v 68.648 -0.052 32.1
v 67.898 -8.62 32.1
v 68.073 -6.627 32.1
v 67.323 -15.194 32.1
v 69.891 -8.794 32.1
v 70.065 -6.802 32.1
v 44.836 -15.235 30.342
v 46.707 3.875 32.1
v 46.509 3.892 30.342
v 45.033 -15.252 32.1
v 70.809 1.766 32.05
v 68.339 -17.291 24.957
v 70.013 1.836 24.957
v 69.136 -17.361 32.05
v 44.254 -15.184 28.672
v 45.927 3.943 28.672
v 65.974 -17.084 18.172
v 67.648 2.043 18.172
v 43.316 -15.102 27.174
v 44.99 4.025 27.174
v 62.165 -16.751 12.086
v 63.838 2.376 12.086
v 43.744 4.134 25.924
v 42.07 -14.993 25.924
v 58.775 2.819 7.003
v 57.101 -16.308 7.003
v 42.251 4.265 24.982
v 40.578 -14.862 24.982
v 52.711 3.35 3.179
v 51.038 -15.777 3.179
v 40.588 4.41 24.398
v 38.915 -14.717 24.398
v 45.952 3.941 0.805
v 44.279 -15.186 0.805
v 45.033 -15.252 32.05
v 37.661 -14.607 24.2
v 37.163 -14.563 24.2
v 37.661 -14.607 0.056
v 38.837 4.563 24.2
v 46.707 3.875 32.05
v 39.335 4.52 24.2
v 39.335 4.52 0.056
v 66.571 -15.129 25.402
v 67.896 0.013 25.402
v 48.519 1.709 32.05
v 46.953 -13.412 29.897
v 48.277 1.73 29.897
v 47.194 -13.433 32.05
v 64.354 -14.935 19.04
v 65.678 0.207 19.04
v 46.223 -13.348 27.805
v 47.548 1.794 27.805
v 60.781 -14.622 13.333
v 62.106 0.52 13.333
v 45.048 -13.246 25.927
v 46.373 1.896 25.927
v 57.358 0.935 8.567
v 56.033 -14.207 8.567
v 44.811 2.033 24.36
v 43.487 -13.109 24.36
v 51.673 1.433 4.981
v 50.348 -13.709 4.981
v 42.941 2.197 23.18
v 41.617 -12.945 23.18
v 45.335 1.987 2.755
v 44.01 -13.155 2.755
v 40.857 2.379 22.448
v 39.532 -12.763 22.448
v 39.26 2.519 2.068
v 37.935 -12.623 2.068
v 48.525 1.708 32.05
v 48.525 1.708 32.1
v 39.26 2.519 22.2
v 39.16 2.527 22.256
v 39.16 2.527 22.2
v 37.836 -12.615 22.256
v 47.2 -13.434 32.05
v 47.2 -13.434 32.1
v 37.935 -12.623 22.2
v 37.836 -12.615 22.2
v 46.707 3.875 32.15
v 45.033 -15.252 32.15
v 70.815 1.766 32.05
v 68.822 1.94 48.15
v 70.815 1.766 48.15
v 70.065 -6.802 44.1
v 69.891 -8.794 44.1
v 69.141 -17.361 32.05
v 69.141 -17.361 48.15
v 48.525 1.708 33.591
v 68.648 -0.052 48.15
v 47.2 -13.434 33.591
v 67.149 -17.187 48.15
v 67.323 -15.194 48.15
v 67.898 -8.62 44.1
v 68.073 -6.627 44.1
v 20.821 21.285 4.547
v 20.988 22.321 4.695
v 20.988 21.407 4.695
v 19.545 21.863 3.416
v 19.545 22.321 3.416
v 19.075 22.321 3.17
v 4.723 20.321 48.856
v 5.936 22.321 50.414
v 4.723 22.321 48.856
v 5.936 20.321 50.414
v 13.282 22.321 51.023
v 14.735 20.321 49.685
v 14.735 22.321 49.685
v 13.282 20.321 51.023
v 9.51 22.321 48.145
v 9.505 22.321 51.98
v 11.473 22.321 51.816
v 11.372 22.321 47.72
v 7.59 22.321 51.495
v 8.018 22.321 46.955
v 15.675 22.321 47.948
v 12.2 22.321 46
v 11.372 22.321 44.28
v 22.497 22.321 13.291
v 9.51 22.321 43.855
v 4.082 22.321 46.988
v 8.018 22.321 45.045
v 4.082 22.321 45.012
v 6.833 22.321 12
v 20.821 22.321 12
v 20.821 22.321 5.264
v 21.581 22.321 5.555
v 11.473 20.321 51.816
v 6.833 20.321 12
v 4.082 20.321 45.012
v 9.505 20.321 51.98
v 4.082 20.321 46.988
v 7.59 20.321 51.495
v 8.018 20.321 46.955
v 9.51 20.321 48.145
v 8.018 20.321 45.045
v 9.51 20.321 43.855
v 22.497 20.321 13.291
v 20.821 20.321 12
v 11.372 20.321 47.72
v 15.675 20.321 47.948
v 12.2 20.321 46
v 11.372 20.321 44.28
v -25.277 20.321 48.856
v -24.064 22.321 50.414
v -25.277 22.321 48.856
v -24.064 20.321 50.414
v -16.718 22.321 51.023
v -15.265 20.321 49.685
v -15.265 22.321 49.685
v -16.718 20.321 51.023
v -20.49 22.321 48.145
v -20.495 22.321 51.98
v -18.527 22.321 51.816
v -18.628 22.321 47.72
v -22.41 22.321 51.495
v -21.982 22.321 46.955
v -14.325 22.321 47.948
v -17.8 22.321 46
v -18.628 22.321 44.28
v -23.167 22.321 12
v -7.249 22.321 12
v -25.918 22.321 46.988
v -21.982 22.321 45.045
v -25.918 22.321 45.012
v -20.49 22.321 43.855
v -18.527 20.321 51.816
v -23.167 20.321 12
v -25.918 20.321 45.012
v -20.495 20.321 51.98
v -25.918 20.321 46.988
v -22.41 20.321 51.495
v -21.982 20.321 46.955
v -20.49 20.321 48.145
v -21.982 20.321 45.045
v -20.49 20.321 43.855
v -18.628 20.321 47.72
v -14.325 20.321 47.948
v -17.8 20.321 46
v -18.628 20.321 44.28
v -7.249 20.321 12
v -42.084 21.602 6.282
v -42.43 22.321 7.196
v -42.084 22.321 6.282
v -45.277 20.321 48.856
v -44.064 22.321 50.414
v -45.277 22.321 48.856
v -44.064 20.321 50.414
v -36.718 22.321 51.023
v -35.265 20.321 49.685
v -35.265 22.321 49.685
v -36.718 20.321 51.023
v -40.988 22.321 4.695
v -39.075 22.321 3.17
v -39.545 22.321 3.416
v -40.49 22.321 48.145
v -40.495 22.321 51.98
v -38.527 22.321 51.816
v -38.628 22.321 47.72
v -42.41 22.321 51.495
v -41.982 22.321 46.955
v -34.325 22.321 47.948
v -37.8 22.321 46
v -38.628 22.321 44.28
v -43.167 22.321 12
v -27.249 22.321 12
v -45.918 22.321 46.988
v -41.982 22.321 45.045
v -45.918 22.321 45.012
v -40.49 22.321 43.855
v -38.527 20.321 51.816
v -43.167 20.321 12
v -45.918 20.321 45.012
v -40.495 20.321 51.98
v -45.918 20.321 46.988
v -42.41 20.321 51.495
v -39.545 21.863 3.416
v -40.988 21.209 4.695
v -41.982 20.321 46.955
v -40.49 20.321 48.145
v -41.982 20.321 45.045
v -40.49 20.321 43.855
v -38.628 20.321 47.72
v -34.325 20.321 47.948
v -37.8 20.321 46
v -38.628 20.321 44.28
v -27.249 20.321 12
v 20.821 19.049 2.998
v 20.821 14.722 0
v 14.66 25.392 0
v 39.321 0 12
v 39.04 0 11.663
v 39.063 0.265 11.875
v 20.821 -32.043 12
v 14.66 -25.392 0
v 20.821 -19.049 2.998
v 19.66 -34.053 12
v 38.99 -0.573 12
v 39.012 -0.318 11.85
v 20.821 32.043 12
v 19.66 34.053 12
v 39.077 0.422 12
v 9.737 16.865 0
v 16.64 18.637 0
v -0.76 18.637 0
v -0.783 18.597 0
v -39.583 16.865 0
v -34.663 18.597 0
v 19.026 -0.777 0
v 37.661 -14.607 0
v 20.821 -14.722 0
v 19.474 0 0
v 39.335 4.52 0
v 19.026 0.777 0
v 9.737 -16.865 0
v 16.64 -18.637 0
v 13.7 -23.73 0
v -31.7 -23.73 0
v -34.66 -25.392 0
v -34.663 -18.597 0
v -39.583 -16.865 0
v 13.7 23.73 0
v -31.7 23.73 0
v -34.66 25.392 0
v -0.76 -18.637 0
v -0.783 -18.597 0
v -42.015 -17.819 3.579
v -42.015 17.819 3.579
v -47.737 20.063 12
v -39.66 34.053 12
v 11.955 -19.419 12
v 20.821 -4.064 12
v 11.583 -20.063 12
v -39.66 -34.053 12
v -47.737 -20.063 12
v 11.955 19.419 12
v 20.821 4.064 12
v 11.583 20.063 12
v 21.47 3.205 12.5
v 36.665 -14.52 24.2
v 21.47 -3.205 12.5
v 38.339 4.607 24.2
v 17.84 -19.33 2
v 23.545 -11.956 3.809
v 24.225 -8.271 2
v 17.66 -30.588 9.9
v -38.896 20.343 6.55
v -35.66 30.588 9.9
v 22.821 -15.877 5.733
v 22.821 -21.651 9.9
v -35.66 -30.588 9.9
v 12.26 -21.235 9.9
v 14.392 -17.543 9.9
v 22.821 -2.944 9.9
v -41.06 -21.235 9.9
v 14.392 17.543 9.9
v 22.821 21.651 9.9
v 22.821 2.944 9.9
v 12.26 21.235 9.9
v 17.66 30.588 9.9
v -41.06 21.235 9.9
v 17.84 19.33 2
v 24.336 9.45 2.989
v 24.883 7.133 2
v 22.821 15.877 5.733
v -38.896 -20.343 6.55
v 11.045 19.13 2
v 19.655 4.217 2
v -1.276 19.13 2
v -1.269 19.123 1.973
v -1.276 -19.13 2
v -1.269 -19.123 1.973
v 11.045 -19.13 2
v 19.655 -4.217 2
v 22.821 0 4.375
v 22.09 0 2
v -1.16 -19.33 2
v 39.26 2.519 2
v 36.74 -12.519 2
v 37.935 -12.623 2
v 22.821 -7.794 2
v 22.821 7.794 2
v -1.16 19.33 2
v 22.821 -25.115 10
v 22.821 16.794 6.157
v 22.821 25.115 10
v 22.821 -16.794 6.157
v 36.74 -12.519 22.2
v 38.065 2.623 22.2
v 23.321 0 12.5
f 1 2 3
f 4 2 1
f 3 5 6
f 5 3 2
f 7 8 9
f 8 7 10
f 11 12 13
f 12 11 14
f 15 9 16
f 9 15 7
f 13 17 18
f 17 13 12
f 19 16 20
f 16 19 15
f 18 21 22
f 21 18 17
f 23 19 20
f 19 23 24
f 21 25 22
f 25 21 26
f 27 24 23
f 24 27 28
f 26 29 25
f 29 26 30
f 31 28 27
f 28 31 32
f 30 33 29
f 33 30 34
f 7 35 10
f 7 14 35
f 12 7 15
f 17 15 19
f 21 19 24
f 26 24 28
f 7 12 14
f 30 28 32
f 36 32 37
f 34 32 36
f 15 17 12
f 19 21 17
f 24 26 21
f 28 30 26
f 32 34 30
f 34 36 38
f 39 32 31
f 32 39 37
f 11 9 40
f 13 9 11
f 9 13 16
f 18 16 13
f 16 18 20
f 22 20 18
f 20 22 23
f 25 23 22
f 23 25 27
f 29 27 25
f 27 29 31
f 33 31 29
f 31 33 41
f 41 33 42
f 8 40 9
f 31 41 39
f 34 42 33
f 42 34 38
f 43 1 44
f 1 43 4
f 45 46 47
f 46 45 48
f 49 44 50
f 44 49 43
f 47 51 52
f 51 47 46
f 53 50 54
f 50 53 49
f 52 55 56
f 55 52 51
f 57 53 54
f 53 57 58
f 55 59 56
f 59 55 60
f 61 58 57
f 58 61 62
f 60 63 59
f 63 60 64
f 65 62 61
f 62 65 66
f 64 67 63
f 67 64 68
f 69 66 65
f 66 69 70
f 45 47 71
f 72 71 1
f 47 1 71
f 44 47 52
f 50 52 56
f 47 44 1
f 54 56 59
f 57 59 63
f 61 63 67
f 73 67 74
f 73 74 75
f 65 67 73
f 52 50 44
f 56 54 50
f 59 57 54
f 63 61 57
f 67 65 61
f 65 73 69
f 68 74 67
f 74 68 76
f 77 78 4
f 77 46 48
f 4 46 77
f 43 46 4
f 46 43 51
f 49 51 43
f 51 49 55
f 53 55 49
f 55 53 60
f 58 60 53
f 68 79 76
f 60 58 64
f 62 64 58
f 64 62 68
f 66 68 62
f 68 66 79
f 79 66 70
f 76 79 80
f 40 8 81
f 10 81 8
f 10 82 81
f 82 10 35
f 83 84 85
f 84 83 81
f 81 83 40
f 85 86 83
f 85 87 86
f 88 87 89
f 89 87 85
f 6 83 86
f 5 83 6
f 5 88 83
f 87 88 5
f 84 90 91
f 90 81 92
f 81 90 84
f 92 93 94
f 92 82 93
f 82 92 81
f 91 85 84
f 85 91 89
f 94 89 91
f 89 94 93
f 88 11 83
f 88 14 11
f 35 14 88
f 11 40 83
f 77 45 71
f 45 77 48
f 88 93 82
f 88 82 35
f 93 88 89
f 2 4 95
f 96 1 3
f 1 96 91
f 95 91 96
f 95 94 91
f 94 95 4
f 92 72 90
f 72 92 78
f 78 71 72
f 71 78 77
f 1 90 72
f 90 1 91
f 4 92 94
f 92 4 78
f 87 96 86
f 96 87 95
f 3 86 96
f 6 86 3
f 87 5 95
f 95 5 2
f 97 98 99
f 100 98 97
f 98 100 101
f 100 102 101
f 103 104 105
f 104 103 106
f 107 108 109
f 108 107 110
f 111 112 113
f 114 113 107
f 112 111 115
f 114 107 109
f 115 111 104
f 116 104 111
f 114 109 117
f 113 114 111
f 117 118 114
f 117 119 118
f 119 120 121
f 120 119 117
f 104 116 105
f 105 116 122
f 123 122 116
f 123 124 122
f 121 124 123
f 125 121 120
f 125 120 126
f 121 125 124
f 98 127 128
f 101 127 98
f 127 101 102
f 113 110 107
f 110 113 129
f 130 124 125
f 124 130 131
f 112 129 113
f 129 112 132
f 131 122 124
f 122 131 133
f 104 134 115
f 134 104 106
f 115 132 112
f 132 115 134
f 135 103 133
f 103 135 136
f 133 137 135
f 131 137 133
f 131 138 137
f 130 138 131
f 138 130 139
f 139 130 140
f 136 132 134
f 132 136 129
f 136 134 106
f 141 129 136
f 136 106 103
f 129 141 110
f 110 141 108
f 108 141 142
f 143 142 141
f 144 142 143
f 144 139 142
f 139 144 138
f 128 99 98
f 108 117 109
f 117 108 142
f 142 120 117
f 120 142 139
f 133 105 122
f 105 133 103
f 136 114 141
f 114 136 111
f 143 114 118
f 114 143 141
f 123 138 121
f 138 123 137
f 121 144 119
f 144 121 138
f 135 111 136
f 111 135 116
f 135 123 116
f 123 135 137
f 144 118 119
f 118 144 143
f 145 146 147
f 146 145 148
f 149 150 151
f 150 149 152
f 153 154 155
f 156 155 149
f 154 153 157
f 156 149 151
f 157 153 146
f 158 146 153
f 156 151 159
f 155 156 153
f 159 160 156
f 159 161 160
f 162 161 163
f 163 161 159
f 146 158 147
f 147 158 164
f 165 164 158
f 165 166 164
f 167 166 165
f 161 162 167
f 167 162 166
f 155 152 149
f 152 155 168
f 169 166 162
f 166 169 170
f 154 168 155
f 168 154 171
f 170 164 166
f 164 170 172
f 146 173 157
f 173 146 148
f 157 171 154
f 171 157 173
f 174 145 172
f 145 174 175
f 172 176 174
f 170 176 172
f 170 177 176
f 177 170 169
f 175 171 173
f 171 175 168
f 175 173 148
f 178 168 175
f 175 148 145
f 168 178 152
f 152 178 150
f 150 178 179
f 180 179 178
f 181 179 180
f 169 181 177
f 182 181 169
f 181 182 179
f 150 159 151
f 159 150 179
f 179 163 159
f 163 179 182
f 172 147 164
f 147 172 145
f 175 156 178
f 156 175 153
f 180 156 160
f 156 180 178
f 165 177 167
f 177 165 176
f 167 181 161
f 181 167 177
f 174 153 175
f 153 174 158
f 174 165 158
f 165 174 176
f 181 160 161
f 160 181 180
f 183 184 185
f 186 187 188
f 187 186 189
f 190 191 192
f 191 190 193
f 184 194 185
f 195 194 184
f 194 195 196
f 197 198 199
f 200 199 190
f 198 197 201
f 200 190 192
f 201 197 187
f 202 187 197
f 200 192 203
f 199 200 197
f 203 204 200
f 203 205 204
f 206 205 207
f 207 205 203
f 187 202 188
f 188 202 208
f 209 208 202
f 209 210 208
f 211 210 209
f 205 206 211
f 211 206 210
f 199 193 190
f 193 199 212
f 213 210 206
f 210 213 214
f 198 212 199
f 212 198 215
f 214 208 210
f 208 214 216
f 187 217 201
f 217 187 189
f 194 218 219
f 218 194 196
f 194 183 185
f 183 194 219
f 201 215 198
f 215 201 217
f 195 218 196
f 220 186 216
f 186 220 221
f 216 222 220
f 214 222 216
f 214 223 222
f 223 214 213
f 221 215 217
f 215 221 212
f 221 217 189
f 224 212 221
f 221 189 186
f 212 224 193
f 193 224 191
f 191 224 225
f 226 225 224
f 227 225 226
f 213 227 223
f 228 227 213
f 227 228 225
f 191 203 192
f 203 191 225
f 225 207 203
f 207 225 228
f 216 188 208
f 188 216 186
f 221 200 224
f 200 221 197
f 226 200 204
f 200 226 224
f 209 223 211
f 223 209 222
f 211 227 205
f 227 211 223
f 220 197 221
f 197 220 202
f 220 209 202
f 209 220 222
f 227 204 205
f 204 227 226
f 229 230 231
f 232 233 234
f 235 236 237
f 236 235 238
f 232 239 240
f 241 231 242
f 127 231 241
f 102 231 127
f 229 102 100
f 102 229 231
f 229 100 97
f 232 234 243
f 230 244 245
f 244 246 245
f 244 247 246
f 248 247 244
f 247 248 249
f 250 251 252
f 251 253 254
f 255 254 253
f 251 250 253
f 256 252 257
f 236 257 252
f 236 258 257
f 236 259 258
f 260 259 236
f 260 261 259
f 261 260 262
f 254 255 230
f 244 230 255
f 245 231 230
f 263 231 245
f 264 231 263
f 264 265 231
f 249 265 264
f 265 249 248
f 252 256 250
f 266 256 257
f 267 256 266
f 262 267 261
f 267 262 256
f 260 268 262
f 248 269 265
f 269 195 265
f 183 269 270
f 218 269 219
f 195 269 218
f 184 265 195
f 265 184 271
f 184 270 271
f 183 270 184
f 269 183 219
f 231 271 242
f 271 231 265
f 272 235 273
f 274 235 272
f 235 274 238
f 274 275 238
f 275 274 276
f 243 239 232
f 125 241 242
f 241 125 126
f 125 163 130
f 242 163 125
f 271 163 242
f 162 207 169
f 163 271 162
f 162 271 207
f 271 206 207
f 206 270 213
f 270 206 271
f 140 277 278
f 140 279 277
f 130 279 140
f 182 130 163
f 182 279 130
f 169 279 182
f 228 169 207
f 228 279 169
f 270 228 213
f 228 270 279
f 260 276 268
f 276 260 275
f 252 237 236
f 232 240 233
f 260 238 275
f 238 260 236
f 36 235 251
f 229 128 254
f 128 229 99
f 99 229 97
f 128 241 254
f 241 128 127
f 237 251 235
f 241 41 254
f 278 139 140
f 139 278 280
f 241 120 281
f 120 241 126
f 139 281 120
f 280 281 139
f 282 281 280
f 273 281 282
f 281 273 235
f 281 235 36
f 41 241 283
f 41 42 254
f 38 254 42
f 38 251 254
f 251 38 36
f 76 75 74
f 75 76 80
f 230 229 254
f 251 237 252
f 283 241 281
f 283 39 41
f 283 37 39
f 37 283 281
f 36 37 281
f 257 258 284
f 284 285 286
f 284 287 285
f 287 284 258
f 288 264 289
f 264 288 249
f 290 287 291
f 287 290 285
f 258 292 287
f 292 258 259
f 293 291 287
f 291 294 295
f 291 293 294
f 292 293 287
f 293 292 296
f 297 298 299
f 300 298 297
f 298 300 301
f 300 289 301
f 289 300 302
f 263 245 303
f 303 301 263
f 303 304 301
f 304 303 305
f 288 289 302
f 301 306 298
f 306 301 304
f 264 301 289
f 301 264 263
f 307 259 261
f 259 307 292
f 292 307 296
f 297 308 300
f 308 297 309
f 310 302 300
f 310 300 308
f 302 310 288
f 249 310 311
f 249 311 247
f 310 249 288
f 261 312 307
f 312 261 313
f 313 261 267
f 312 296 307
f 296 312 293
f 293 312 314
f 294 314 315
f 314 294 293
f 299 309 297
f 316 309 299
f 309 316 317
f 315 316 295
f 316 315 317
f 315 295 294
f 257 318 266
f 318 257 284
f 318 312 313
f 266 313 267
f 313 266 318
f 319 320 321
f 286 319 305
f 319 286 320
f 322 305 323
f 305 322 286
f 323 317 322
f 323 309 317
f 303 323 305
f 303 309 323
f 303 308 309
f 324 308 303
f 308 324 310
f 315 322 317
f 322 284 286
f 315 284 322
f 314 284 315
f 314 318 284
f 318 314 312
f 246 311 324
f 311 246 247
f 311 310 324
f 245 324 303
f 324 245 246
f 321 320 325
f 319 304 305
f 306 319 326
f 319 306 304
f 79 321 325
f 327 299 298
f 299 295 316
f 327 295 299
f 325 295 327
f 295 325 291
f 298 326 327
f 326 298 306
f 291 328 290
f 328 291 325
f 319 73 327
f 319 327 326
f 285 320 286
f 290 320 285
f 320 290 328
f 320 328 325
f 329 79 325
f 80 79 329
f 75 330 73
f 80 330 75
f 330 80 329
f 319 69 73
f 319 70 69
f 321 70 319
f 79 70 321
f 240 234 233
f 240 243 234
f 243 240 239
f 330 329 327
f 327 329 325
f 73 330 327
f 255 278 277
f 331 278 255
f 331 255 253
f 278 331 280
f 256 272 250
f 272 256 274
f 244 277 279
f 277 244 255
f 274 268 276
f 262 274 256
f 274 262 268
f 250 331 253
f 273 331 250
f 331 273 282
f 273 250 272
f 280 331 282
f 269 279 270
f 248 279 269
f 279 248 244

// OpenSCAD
hot_rad = 30/2/cos(30);
hotend_x=25;
fan_x = 15+5;

hotend_y=-5;

thickness = 10;
wall=2;
slop=.2;

fan_hole = (40-wall-wall)/2;
mount_drop = 10;
fan_z = fan_hole+wall;

//fan_mount();
bowden_fan();

%cylinder(r=hot_rad, h=20, center=true);
%translate([-23,0,0]) cylinder(r=hot_rad, h=20, center=true);

m3_cap_rad = 4;
m3_rad = 2;
m3_nut_rad = 6.01/2+.1;

facets = 6;

duct_angle=-5;
duct_jut = -5;

module bowden_fan(){
    duct_w = 15+slop;
    duct_h = 20+slop;
    duct_offset=38;
    
    mount_height = 46;
    
    offset = -20;
    difference(){
        union(){
            //core
            hull(){
                cylinder(r1=hot_rad+thickness+wall, r2=hot_rad+thickness*2+wall, h=thickness+wall, $fn=facets);
                translate([offset,0,0]) cylinder(r1=hot_rad+thickness+wall, r2=hot_rad+thickness*2+wall, h=thickness+wall, $fn=facets);
            }
            
            //connection to duct
            hull(){
                intersection(){
                    cylinder(r1=hot_rad+thickness+wall, r2=hot_rad+thickness*2+wall, h=thickness+wall, $fn=facets);
                    translate([hot_rad+wall*2,0,0]) cube([1,200,200], center=true);
                }
                translate([duct_offset,duct_jut,duct_h/2+wall]) rotate([0,0,duct_angle]) cube([1,duct_w+wall*2, duct_h+wall*2], center=true);
            }
            
            //the duct connector
            translate([duct_offset,duct_jut,0]) rotate([0,0,duct_angle]) duct();
            
            //mounting lugs
           for(i=[10,-20,-40]) difference(){
                translate([i,hot_rad+wall*2,0]) hull(){
                    translate([5,0,thickness]) rotate([90,0,0]) cylinder(r=m3_cap_rad+wall*2, h=wall, center=true);
                    translate([0,0,mount_height]) rotate([90,0,0]) cylinder(r=m3_cap_rad+wall, h=wall, center=true);
                }
                
                //mounting holes up top
                translate([i,hot_rad+wall*2,mount_height]) rotate([90,0,0]) cylinder(r=m3_rad+slop, h=20, center=true);
            }
        }
        
        //connection to duct airflow
        hull(){
            intersection(){
                translate([0,0,wall]) cylinder(r1=hot_rad+thickness, r2=hot_rad+thickness*2, h=thickness-wall, $fn=facets);
                translate([hot_rad+wall*3,0,0]) cube([1,200,200], center=true);
            }
            translate([duct_offset,duct_jut,duct_h/2+wall]) rotate([0,0,duct_angle]) cube([1.2,duct_w, duct_h], center=true);
        }
        
        //center cutout
        translate([0,0,-.5]) hull(){
            cylinder(r1=hot_rad+wall, r2=hot_rad+wall*3, h=thickness+wall+1, $fn=facets);
            translate([2*offset,0,0]) cylinder(r1=hot_rad+wall, r2=hot_rad+wall*3, h=thickness+wall+1, $fn=facets);
        }
        
        //air path
        difference(){
            //core
            translate([0,0,-.1]) hull(){
                cylinder(r1=hot_rad+thickness, r2=hot_rad+thickness*2-wall, h=thickness, $fn=facets);
                translate([offset+wall,0,0]) cylinder(r1=hot_rad+thickness, r2=hot_rad+thickness*2-wall, h=thickness, $fn=facets);
            }
            
            //keep the center walls in place
            translate([0,0,-.5]) hull(){
                cylinder(r1=hot_rad+wall*2, r2=hot_rad+wall*4, h=thickness+wall+1, $fn=facets);
                translate([2*offset,0,0]) cylinder(r1=hot_rad+wall*2, r2=hot_rad+wall*4, h=thickness+wall+1, $fn=facets);
            }
            
            //bottom on the near side
            translate([10,0,-.5]) cylinder(r1=hot_rad+wall*2, r2=hot_rad+wall*2.5, h=wall+.5, $fn=facets);
        }
    }
}

module duct(){
    duct_w = 15+slop;
    duct_h = 20+slop;
    rad = 20;
    
    translate([0,0,rad+wall+duct_h/2]) rotate([-90,0,0]) union(){
        intersection(){
            rotate_extrude(angle = 90, convexity = 2){
                translate([rad,0,0])
                difference(){
                    square([duct_h+wall*2, duct_w+wall*2], center=true);
                    square([duct_h, duct_w], center=true);
                }
            }
            translate([0,0,-100]) cube([200,200,200]);
        }
        
        translate([rad,0,0]) rotate([90,0,0]) translate([0,0,8]) difference(){
            hull(){
                translate([0,0,-8]) cube([duct_h+wall*2,duct_w+wall*2,.1], center=true);
                #translate([duct_h/2+wall/2,0,8]) cube([wall,duct_w+wall*2,.1], center=true);
            }
            
            //hollow center
            cube([duct_h,duct_w,16.3], center=true);
            
            //slot for the clip
            translate([wall+1,0,(12-16)/2]) cube([duct_h+wall*2,2,12], center=true);
        }
        
    }
    
}
